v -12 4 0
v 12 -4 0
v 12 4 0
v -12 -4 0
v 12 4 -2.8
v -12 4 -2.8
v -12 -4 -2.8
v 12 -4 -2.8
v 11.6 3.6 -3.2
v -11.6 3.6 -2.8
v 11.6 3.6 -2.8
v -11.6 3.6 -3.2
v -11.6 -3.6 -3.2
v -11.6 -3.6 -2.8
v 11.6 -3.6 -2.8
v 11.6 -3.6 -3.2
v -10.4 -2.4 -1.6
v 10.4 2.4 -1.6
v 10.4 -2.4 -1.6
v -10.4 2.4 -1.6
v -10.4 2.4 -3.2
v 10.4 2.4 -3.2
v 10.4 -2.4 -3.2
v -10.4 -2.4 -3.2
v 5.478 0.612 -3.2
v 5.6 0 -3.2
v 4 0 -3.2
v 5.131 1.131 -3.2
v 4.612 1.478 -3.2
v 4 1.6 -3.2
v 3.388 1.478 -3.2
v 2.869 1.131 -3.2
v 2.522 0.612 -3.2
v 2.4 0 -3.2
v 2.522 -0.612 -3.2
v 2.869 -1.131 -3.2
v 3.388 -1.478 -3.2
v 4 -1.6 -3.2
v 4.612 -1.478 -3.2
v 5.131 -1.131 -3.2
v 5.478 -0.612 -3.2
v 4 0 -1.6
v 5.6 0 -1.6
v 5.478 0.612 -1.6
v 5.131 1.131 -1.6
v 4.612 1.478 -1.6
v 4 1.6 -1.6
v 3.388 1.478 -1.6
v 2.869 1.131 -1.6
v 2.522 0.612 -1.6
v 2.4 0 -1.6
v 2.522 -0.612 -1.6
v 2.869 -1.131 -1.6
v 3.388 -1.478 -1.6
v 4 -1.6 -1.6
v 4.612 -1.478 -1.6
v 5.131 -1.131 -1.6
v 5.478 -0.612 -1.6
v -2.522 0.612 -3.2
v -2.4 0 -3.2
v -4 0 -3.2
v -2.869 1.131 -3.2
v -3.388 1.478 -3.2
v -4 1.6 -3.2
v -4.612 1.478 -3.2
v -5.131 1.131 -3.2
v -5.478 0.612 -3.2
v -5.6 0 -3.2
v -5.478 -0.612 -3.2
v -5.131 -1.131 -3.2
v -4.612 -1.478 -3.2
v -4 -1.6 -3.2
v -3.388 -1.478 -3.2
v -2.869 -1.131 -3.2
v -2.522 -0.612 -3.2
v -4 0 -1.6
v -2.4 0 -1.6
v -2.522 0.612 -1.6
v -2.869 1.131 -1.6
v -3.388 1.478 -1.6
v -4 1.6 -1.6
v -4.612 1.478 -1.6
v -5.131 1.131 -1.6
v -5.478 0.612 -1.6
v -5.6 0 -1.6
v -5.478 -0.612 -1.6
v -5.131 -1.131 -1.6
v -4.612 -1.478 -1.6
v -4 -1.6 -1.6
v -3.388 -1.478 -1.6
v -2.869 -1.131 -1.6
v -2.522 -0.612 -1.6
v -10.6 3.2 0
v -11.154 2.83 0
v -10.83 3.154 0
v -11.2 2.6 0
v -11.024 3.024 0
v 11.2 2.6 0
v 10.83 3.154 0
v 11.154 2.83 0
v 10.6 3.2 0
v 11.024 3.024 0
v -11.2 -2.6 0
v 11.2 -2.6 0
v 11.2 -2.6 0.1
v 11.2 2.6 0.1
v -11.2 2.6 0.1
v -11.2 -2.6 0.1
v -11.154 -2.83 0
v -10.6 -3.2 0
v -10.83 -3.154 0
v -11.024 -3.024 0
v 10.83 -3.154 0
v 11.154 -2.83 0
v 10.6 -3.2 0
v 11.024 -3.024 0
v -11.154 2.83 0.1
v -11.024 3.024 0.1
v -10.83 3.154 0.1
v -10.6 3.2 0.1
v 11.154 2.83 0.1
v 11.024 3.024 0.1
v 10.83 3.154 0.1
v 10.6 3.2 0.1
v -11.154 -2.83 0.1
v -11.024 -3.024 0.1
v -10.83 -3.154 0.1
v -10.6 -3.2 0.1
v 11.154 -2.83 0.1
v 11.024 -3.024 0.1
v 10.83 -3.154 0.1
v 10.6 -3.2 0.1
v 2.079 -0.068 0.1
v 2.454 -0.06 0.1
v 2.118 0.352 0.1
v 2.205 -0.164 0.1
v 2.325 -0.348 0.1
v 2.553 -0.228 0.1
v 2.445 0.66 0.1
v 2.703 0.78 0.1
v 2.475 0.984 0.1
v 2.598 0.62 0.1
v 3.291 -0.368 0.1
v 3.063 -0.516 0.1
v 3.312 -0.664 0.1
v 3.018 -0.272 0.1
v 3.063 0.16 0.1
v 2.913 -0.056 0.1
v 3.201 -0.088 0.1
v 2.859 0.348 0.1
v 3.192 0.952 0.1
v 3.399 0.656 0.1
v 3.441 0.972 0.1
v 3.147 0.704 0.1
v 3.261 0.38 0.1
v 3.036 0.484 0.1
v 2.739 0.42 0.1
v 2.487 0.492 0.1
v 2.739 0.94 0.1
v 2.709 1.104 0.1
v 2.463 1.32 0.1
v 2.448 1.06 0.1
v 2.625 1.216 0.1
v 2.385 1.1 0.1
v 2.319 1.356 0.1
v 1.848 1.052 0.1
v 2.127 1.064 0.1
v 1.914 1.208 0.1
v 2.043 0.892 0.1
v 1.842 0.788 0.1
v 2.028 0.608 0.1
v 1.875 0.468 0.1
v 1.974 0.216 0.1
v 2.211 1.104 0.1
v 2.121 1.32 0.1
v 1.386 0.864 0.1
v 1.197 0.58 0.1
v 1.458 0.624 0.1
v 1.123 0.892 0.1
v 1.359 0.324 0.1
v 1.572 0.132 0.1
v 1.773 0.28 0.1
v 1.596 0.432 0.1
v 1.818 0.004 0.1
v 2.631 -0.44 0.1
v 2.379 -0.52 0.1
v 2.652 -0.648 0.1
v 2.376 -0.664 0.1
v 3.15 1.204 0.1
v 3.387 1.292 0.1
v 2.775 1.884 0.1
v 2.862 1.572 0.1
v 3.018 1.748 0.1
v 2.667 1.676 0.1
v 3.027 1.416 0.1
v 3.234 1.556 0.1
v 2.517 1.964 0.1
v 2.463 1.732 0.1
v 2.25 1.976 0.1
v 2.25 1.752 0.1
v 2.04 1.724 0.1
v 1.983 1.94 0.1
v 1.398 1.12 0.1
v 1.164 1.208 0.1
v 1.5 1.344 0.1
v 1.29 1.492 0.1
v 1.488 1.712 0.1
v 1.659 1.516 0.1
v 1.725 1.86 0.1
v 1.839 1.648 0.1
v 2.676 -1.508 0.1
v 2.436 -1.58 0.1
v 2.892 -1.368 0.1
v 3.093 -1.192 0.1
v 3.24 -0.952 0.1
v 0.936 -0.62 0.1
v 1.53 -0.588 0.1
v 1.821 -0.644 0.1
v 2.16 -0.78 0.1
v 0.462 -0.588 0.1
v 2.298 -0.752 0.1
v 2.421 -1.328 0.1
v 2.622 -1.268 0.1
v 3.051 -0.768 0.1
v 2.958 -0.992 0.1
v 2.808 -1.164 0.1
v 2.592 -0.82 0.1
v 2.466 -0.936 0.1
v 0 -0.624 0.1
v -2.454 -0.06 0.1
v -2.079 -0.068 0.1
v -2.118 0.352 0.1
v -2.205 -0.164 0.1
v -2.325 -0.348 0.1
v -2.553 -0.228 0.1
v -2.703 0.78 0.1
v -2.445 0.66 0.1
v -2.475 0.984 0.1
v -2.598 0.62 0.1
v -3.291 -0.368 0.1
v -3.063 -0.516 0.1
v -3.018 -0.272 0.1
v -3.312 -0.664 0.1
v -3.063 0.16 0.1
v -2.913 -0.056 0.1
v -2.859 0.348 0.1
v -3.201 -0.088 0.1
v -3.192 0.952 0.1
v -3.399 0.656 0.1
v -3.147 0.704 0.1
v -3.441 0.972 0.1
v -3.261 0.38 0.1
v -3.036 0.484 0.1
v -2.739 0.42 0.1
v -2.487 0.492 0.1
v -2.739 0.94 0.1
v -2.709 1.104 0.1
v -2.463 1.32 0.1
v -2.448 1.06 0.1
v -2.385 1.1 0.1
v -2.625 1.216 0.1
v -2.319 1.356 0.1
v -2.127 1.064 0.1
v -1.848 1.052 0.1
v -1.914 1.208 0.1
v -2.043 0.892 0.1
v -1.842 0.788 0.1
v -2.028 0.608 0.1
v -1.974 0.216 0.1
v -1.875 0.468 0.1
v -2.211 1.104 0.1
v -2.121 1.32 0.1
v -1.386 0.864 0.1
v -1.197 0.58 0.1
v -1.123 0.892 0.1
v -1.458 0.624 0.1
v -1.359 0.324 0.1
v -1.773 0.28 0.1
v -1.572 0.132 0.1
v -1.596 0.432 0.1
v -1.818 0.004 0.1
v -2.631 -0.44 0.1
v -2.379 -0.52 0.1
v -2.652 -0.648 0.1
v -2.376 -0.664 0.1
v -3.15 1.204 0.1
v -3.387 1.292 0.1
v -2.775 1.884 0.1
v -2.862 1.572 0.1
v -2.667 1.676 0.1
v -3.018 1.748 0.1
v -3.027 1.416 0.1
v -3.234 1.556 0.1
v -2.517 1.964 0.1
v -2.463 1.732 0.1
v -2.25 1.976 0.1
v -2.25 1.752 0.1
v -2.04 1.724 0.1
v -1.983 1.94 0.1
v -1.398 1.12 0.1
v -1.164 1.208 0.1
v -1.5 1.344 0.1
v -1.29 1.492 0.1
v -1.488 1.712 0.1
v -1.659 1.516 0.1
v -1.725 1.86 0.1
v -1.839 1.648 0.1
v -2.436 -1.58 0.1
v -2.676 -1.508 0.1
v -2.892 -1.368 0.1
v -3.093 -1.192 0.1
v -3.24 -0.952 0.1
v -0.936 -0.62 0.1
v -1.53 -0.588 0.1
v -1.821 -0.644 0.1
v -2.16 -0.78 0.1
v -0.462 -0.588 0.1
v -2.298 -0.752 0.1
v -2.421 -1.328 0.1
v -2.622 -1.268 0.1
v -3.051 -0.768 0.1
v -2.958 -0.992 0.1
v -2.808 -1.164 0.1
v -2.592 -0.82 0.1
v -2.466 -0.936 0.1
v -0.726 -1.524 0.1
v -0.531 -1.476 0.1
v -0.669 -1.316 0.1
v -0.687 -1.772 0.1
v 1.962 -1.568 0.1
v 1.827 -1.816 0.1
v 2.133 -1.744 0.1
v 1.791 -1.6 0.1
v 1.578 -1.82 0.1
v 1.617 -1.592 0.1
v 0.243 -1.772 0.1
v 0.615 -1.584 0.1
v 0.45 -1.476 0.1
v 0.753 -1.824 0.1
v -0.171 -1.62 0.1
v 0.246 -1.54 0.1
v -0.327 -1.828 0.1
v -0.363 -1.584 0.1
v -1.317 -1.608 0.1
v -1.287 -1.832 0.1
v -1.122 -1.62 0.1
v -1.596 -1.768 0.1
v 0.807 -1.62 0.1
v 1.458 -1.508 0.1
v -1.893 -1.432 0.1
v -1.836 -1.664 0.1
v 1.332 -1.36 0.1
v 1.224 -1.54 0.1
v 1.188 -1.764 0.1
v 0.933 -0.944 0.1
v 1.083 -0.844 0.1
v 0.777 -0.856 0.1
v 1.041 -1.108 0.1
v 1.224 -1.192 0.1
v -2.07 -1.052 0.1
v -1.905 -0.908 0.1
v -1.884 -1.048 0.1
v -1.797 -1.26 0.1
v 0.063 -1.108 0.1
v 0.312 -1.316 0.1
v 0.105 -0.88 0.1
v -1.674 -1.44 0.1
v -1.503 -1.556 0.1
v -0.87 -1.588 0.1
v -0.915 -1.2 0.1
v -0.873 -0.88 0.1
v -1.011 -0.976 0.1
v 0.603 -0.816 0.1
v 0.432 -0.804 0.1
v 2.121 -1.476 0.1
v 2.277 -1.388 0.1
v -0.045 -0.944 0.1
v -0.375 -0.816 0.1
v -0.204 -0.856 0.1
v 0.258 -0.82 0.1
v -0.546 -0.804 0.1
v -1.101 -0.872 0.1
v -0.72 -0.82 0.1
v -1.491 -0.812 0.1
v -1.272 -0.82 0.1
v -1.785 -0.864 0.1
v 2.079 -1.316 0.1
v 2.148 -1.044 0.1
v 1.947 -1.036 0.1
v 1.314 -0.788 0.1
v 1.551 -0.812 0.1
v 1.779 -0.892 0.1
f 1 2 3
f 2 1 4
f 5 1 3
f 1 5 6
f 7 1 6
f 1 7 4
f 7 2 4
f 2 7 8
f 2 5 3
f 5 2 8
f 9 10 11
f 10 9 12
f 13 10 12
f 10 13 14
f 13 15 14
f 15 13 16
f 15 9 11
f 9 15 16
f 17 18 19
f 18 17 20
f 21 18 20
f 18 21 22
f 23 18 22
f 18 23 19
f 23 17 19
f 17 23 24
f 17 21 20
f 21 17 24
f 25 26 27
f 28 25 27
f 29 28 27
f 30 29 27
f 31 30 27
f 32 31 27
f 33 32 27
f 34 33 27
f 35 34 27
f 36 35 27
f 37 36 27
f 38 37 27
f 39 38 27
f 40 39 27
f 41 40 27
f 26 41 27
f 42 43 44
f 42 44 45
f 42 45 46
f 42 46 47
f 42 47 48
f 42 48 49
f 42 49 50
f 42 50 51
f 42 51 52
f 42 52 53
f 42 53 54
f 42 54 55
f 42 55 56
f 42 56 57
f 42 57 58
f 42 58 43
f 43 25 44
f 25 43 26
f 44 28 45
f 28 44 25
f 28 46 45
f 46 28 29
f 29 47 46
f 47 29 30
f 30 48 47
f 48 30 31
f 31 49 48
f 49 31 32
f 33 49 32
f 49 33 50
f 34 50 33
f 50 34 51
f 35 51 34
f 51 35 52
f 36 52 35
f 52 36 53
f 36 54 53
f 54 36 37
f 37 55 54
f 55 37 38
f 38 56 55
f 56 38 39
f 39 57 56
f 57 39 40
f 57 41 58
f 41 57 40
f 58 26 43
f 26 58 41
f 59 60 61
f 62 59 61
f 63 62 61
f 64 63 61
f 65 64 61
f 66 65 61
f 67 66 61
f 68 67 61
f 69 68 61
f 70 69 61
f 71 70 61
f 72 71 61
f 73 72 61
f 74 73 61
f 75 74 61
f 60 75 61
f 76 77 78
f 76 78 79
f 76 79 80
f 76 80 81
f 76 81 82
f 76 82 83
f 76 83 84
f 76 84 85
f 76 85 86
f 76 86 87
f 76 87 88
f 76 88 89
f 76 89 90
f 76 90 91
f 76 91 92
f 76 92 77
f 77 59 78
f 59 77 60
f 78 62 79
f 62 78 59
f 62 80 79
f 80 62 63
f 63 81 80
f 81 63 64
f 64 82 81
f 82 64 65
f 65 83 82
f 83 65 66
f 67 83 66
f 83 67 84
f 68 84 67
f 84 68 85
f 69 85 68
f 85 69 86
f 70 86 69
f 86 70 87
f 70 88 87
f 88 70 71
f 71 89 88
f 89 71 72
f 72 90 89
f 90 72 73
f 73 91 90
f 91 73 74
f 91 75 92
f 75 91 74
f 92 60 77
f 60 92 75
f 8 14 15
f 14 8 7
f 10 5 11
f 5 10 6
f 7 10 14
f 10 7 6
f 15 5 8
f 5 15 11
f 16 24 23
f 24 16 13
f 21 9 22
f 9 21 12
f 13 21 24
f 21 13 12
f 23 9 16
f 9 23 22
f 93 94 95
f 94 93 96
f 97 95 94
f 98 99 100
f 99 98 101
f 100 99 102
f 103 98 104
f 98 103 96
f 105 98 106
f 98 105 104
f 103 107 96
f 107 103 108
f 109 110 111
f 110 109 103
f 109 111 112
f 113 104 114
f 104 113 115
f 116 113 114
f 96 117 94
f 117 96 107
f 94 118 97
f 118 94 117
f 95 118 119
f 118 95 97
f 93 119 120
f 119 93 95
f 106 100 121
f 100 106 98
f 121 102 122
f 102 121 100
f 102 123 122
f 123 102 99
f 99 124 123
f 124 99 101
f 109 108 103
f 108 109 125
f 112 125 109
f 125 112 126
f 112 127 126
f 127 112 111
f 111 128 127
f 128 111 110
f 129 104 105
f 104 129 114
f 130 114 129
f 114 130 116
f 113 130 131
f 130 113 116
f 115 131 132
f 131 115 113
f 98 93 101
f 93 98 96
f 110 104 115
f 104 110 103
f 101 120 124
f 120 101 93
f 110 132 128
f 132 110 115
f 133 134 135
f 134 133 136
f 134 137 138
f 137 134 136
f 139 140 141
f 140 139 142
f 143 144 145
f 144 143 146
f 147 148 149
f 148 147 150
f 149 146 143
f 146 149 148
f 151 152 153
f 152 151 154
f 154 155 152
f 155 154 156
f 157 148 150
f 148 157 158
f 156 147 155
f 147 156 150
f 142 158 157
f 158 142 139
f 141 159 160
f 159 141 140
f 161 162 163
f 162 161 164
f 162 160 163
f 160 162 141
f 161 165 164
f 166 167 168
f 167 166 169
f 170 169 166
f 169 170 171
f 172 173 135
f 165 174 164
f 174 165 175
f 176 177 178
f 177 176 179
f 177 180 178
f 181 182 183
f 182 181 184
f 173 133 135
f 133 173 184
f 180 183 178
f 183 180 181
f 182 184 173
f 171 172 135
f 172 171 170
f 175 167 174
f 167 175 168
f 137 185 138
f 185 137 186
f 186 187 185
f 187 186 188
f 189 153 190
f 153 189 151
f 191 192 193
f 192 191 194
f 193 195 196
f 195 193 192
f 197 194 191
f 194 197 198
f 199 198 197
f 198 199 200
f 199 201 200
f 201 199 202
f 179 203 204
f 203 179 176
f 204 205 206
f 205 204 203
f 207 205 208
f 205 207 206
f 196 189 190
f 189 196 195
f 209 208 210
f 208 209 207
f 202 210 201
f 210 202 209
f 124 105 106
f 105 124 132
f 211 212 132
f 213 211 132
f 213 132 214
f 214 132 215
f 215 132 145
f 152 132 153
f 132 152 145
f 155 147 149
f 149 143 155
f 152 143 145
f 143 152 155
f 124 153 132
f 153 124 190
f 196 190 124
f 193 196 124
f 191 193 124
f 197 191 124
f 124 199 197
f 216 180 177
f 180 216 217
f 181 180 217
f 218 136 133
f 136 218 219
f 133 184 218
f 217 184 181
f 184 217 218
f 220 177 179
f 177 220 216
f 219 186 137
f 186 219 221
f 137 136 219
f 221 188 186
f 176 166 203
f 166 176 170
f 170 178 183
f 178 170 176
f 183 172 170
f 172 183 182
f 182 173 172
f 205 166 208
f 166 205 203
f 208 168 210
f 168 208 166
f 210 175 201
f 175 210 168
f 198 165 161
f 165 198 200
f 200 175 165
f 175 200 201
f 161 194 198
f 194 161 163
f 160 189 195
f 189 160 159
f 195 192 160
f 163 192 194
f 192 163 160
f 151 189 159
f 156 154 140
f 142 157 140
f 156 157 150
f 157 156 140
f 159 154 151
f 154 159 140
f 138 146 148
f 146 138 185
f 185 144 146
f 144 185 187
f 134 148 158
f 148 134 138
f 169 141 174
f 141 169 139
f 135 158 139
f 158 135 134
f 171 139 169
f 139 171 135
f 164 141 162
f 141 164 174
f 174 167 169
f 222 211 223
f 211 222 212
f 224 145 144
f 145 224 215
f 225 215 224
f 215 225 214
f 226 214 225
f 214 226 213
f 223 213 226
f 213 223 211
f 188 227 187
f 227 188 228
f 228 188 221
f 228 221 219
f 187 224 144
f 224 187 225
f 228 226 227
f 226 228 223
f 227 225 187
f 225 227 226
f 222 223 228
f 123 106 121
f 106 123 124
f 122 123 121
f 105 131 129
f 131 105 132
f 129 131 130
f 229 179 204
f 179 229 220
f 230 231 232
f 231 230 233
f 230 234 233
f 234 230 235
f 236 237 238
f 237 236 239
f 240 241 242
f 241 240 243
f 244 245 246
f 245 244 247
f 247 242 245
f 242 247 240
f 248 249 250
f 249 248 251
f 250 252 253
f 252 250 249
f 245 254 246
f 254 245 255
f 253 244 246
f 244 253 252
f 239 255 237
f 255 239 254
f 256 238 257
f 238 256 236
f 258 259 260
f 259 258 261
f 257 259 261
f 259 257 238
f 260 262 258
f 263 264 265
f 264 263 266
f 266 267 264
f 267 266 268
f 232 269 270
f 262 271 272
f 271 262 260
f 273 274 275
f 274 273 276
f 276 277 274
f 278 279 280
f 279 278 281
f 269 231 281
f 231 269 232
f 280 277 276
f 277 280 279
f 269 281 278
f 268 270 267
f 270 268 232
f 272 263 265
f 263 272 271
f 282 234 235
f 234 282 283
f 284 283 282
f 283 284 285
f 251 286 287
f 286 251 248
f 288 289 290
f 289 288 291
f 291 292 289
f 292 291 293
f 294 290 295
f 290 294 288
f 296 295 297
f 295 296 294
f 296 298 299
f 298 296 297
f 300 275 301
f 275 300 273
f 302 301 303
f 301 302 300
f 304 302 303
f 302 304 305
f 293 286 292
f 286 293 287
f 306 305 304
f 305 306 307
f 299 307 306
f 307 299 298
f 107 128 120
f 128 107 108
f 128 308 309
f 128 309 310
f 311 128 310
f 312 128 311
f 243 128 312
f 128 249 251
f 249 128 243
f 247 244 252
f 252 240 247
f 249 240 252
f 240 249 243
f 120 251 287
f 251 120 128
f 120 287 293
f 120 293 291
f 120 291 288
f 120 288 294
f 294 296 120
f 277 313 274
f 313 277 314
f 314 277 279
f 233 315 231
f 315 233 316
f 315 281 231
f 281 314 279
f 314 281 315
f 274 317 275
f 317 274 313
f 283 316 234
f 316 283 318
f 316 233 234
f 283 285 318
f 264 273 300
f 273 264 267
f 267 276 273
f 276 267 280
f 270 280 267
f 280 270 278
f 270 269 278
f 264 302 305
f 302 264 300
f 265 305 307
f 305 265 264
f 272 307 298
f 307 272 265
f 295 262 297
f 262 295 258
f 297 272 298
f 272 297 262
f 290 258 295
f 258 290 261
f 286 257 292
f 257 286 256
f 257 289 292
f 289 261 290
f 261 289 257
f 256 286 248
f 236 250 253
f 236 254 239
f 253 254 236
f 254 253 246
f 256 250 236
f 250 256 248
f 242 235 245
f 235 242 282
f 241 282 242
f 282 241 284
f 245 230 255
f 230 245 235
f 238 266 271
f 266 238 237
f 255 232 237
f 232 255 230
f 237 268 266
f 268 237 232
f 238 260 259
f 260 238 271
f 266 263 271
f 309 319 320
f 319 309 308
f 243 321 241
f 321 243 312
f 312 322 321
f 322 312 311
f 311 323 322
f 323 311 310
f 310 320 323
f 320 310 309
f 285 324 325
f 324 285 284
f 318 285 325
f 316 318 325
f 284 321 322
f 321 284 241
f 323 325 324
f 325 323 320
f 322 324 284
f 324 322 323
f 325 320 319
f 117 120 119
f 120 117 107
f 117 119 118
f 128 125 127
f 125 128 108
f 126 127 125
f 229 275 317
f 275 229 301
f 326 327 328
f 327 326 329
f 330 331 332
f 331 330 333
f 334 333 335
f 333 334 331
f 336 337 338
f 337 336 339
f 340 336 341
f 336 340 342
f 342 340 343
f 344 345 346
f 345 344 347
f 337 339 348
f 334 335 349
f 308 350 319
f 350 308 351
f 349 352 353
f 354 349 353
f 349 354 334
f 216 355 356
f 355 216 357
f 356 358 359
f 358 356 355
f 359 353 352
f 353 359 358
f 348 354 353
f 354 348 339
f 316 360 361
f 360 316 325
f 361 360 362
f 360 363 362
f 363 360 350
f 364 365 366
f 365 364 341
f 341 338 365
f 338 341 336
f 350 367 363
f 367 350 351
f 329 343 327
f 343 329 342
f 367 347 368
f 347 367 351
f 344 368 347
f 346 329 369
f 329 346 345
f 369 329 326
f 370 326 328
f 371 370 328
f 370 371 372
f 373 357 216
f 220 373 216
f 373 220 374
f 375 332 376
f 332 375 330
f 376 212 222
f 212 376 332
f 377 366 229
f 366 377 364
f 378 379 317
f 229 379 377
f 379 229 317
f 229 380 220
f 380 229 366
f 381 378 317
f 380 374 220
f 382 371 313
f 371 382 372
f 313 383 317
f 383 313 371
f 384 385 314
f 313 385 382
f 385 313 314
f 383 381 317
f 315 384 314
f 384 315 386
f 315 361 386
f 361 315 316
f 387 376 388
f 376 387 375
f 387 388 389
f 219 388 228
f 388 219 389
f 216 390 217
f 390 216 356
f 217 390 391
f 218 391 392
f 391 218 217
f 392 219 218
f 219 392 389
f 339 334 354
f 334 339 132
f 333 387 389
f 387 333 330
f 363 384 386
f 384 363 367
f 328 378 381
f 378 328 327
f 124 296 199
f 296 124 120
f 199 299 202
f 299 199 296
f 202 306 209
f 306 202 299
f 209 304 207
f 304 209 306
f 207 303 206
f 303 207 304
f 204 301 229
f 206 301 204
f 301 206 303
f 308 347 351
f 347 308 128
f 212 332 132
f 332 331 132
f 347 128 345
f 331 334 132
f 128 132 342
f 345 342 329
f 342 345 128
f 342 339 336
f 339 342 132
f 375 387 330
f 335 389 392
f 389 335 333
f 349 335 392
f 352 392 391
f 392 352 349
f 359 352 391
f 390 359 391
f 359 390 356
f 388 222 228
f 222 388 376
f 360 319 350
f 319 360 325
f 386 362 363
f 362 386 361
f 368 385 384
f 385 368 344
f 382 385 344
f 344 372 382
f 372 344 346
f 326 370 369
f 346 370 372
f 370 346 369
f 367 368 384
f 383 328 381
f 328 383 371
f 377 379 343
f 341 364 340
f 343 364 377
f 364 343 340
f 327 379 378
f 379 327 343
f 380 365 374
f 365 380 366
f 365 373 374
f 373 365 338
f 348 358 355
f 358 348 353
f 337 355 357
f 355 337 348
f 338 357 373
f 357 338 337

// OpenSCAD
use <../lib.scad>
use <63864.scad>
use <6521012a.scad>
function ldraw_lib__63864d04() = [
// 0 Tile  1 x  3 with Medium Nougat Drawer Front with Ornamented Gold Handle Sticker
// 0 Name: 63864d04.dat
// 0 Author: Philippe Hurbain [Philo]
// 0 !LDRAW_ORG Shortcut UPDATE 2026-07
// 0 !LICENSE Licensed under CC BY 4.0 : see CAreadme.txt
// 
// 0 BFC CERTIFY CCW
  [0,"BFC","CERTIFY"],
  [0,"BFC","CCW"],
// 
// 0 !CATEGORY Sticker Shortcut
// 0 !KEYWORDS Beekeepers' House and Flower Garden, BrickLink 42669stk01, Friends
// 0 !KEYWORDS Rebrickable 10110453, Set 42669
// 
// 0 !HISTORY 2026-07-30 [OrionP] Official Update 2026-07
// 
// 1 16 0 0 0 1 0 0 0 1 0 0 0 1 63864.dat
  [1,16,0,0,0,1,0,0,0,1,0,0,0,1, ldraw_lib__63864()],
// 1 16 0 0 0 1 0 0 0 1 0 0 0 1 6521012a.dat
  [1,16,0,0,0,1,0,0,0,1,0,0,0,1, ldraw_lib__6521012a()],
];
module ldraw_lib__63864d04(step=0, col=false, unit=2/5, alt=false, line=0.2, solid=!$preview)
    makepoly(ldraw_lib__63864d04(), step=step, col=col, unit=unit, alt=alt, line=line, solid=solid);
ldraw_lib__63864d04(line=0.2);
